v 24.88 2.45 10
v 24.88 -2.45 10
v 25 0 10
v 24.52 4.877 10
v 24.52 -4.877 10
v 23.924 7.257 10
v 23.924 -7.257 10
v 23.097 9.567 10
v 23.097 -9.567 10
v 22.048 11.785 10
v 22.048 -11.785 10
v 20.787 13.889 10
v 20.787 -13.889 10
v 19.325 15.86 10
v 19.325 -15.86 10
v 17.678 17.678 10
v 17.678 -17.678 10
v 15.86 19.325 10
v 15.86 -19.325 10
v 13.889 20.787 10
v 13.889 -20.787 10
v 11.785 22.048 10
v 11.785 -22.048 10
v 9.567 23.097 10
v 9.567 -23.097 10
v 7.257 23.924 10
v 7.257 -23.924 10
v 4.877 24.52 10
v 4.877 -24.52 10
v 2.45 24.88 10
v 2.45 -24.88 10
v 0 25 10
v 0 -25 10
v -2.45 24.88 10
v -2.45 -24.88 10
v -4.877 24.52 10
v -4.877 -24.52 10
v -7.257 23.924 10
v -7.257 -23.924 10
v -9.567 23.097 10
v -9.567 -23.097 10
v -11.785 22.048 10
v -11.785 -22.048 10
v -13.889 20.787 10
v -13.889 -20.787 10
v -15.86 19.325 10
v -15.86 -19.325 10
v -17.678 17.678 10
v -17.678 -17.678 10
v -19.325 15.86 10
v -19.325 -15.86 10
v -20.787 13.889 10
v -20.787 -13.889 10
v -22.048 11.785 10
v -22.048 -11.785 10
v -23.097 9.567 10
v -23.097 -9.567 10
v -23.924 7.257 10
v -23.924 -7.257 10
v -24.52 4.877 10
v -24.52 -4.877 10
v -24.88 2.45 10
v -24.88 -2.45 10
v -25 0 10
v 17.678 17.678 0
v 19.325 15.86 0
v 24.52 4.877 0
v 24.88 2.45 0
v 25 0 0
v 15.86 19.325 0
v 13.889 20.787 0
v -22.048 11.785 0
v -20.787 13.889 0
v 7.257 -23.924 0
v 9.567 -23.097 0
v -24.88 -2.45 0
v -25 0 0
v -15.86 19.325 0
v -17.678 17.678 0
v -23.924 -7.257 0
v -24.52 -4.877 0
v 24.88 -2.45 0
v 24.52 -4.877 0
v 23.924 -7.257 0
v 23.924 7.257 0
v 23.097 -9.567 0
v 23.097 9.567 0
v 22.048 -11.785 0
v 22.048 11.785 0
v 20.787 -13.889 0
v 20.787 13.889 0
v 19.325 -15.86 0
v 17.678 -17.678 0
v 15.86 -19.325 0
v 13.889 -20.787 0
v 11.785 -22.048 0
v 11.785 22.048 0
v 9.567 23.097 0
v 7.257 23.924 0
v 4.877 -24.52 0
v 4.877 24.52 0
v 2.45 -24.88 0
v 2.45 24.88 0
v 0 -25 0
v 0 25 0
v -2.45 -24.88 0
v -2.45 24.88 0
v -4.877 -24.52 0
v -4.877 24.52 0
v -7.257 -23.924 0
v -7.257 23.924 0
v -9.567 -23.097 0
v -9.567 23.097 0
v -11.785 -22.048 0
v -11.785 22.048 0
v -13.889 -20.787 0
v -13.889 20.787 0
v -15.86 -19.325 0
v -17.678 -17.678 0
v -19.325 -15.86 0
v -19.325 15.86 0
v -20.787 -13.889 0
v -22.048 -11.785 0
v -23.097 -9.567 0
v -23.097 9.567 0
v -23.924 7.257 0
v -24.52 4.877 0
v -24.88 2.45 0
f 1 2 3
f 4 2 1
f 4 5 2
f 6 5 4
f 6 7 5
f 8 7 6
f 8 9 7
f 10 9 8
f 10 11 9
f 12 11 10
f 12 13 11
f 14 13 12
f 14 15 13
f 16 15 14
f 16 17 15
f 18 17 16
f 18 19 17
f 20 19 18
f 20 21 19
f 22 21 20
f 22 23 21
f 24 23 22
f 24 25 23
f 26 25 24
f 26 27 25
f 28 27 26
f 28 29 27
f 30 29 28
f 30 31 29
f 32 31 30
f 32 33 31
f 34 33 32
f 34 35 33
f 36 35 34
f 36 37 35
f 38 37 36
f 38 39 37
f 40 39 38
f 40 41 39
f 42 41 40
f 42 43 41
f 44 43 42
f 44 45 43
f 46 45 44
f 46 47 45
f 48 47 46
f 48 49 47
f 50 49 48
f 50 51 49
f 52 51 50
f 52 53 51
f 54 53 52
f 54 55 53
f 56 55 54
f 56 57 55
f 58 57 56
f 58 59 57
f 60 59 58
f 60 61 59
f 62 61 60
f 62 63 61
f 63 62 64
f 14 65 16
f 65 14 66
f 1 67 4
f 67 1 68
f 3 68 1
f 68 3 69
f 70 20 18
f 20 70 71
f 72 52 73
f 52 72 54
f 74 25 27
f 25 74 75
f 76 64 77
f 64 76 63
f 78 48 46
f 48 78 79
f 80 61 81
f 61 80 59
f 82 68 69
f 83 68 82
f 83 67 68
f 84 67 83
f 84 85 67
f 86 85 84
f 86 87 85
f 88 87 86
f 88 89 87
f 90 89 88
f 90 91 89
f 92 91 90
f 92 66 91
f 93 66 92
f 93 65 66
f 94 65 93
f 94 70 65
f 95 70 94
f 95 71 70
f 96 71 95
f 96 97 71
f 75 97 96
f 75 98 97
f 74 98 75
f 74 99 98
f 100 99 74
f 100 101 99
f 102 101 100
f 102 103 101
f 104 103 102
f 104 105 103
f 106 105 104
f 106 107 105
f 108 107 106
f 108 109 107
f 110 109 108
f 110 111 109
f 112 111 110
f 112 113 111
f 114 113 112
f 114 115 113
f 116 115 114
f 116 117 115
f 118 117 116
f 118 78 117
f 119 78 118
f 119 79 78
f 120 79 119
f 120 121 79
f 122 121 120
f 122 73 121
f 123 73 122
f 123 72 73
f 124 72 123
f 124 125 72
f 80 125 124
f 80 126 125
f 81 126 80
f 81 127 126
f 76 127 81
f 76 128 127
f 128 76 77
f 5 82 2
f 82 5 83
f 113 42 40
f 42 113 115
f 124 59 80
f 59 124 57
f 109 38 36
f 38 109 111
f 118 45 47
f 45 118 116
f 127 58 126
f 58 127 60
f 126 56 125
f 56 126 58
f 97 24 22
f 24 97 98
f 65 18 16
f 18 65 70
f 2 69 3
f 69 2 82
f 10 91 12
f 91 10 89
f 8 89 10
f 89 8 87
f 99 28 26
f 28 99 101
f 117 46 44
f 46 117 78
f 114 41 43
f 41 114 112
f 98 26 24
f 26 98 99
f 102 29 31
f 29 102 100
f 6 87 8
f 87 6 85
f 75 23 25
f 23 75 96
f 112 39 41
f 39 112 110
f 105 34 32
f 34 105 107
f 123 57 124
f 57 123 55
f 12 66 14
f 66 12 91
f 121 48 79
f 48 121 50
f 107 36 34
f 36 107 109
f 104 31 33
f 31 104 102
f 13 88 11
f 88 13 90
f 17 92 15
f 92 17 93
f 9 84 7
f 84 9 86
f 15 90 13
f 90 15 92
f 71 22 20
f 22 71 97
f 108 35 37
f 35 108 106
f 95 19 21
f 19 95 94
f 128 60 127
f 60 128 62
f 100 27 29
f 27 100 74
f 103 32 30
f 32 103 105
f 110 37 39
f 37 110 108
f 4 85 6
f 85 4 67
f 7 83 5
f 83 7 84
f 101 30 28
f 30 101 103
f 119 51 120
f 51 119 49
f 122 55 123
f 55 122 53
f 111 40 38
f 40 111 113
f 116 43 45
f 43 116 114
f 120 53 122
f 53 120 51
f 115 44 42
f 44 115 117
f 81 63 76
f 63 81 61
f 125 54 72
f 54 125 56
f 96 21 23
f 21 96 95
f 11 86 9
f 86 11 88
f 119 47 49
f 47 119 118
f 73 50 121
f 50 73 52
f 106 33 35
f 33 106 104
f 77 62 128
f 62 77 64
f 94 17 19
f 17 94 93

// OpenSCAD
intersection(){cube(size=[200.0000,200.0000,20.0000],center=true);cylinder(h=100.0000,d=50.0000,$fn=64);cylinder(h=100.0000,d1=80.0000,d2=0.0000,$fn=64);}
